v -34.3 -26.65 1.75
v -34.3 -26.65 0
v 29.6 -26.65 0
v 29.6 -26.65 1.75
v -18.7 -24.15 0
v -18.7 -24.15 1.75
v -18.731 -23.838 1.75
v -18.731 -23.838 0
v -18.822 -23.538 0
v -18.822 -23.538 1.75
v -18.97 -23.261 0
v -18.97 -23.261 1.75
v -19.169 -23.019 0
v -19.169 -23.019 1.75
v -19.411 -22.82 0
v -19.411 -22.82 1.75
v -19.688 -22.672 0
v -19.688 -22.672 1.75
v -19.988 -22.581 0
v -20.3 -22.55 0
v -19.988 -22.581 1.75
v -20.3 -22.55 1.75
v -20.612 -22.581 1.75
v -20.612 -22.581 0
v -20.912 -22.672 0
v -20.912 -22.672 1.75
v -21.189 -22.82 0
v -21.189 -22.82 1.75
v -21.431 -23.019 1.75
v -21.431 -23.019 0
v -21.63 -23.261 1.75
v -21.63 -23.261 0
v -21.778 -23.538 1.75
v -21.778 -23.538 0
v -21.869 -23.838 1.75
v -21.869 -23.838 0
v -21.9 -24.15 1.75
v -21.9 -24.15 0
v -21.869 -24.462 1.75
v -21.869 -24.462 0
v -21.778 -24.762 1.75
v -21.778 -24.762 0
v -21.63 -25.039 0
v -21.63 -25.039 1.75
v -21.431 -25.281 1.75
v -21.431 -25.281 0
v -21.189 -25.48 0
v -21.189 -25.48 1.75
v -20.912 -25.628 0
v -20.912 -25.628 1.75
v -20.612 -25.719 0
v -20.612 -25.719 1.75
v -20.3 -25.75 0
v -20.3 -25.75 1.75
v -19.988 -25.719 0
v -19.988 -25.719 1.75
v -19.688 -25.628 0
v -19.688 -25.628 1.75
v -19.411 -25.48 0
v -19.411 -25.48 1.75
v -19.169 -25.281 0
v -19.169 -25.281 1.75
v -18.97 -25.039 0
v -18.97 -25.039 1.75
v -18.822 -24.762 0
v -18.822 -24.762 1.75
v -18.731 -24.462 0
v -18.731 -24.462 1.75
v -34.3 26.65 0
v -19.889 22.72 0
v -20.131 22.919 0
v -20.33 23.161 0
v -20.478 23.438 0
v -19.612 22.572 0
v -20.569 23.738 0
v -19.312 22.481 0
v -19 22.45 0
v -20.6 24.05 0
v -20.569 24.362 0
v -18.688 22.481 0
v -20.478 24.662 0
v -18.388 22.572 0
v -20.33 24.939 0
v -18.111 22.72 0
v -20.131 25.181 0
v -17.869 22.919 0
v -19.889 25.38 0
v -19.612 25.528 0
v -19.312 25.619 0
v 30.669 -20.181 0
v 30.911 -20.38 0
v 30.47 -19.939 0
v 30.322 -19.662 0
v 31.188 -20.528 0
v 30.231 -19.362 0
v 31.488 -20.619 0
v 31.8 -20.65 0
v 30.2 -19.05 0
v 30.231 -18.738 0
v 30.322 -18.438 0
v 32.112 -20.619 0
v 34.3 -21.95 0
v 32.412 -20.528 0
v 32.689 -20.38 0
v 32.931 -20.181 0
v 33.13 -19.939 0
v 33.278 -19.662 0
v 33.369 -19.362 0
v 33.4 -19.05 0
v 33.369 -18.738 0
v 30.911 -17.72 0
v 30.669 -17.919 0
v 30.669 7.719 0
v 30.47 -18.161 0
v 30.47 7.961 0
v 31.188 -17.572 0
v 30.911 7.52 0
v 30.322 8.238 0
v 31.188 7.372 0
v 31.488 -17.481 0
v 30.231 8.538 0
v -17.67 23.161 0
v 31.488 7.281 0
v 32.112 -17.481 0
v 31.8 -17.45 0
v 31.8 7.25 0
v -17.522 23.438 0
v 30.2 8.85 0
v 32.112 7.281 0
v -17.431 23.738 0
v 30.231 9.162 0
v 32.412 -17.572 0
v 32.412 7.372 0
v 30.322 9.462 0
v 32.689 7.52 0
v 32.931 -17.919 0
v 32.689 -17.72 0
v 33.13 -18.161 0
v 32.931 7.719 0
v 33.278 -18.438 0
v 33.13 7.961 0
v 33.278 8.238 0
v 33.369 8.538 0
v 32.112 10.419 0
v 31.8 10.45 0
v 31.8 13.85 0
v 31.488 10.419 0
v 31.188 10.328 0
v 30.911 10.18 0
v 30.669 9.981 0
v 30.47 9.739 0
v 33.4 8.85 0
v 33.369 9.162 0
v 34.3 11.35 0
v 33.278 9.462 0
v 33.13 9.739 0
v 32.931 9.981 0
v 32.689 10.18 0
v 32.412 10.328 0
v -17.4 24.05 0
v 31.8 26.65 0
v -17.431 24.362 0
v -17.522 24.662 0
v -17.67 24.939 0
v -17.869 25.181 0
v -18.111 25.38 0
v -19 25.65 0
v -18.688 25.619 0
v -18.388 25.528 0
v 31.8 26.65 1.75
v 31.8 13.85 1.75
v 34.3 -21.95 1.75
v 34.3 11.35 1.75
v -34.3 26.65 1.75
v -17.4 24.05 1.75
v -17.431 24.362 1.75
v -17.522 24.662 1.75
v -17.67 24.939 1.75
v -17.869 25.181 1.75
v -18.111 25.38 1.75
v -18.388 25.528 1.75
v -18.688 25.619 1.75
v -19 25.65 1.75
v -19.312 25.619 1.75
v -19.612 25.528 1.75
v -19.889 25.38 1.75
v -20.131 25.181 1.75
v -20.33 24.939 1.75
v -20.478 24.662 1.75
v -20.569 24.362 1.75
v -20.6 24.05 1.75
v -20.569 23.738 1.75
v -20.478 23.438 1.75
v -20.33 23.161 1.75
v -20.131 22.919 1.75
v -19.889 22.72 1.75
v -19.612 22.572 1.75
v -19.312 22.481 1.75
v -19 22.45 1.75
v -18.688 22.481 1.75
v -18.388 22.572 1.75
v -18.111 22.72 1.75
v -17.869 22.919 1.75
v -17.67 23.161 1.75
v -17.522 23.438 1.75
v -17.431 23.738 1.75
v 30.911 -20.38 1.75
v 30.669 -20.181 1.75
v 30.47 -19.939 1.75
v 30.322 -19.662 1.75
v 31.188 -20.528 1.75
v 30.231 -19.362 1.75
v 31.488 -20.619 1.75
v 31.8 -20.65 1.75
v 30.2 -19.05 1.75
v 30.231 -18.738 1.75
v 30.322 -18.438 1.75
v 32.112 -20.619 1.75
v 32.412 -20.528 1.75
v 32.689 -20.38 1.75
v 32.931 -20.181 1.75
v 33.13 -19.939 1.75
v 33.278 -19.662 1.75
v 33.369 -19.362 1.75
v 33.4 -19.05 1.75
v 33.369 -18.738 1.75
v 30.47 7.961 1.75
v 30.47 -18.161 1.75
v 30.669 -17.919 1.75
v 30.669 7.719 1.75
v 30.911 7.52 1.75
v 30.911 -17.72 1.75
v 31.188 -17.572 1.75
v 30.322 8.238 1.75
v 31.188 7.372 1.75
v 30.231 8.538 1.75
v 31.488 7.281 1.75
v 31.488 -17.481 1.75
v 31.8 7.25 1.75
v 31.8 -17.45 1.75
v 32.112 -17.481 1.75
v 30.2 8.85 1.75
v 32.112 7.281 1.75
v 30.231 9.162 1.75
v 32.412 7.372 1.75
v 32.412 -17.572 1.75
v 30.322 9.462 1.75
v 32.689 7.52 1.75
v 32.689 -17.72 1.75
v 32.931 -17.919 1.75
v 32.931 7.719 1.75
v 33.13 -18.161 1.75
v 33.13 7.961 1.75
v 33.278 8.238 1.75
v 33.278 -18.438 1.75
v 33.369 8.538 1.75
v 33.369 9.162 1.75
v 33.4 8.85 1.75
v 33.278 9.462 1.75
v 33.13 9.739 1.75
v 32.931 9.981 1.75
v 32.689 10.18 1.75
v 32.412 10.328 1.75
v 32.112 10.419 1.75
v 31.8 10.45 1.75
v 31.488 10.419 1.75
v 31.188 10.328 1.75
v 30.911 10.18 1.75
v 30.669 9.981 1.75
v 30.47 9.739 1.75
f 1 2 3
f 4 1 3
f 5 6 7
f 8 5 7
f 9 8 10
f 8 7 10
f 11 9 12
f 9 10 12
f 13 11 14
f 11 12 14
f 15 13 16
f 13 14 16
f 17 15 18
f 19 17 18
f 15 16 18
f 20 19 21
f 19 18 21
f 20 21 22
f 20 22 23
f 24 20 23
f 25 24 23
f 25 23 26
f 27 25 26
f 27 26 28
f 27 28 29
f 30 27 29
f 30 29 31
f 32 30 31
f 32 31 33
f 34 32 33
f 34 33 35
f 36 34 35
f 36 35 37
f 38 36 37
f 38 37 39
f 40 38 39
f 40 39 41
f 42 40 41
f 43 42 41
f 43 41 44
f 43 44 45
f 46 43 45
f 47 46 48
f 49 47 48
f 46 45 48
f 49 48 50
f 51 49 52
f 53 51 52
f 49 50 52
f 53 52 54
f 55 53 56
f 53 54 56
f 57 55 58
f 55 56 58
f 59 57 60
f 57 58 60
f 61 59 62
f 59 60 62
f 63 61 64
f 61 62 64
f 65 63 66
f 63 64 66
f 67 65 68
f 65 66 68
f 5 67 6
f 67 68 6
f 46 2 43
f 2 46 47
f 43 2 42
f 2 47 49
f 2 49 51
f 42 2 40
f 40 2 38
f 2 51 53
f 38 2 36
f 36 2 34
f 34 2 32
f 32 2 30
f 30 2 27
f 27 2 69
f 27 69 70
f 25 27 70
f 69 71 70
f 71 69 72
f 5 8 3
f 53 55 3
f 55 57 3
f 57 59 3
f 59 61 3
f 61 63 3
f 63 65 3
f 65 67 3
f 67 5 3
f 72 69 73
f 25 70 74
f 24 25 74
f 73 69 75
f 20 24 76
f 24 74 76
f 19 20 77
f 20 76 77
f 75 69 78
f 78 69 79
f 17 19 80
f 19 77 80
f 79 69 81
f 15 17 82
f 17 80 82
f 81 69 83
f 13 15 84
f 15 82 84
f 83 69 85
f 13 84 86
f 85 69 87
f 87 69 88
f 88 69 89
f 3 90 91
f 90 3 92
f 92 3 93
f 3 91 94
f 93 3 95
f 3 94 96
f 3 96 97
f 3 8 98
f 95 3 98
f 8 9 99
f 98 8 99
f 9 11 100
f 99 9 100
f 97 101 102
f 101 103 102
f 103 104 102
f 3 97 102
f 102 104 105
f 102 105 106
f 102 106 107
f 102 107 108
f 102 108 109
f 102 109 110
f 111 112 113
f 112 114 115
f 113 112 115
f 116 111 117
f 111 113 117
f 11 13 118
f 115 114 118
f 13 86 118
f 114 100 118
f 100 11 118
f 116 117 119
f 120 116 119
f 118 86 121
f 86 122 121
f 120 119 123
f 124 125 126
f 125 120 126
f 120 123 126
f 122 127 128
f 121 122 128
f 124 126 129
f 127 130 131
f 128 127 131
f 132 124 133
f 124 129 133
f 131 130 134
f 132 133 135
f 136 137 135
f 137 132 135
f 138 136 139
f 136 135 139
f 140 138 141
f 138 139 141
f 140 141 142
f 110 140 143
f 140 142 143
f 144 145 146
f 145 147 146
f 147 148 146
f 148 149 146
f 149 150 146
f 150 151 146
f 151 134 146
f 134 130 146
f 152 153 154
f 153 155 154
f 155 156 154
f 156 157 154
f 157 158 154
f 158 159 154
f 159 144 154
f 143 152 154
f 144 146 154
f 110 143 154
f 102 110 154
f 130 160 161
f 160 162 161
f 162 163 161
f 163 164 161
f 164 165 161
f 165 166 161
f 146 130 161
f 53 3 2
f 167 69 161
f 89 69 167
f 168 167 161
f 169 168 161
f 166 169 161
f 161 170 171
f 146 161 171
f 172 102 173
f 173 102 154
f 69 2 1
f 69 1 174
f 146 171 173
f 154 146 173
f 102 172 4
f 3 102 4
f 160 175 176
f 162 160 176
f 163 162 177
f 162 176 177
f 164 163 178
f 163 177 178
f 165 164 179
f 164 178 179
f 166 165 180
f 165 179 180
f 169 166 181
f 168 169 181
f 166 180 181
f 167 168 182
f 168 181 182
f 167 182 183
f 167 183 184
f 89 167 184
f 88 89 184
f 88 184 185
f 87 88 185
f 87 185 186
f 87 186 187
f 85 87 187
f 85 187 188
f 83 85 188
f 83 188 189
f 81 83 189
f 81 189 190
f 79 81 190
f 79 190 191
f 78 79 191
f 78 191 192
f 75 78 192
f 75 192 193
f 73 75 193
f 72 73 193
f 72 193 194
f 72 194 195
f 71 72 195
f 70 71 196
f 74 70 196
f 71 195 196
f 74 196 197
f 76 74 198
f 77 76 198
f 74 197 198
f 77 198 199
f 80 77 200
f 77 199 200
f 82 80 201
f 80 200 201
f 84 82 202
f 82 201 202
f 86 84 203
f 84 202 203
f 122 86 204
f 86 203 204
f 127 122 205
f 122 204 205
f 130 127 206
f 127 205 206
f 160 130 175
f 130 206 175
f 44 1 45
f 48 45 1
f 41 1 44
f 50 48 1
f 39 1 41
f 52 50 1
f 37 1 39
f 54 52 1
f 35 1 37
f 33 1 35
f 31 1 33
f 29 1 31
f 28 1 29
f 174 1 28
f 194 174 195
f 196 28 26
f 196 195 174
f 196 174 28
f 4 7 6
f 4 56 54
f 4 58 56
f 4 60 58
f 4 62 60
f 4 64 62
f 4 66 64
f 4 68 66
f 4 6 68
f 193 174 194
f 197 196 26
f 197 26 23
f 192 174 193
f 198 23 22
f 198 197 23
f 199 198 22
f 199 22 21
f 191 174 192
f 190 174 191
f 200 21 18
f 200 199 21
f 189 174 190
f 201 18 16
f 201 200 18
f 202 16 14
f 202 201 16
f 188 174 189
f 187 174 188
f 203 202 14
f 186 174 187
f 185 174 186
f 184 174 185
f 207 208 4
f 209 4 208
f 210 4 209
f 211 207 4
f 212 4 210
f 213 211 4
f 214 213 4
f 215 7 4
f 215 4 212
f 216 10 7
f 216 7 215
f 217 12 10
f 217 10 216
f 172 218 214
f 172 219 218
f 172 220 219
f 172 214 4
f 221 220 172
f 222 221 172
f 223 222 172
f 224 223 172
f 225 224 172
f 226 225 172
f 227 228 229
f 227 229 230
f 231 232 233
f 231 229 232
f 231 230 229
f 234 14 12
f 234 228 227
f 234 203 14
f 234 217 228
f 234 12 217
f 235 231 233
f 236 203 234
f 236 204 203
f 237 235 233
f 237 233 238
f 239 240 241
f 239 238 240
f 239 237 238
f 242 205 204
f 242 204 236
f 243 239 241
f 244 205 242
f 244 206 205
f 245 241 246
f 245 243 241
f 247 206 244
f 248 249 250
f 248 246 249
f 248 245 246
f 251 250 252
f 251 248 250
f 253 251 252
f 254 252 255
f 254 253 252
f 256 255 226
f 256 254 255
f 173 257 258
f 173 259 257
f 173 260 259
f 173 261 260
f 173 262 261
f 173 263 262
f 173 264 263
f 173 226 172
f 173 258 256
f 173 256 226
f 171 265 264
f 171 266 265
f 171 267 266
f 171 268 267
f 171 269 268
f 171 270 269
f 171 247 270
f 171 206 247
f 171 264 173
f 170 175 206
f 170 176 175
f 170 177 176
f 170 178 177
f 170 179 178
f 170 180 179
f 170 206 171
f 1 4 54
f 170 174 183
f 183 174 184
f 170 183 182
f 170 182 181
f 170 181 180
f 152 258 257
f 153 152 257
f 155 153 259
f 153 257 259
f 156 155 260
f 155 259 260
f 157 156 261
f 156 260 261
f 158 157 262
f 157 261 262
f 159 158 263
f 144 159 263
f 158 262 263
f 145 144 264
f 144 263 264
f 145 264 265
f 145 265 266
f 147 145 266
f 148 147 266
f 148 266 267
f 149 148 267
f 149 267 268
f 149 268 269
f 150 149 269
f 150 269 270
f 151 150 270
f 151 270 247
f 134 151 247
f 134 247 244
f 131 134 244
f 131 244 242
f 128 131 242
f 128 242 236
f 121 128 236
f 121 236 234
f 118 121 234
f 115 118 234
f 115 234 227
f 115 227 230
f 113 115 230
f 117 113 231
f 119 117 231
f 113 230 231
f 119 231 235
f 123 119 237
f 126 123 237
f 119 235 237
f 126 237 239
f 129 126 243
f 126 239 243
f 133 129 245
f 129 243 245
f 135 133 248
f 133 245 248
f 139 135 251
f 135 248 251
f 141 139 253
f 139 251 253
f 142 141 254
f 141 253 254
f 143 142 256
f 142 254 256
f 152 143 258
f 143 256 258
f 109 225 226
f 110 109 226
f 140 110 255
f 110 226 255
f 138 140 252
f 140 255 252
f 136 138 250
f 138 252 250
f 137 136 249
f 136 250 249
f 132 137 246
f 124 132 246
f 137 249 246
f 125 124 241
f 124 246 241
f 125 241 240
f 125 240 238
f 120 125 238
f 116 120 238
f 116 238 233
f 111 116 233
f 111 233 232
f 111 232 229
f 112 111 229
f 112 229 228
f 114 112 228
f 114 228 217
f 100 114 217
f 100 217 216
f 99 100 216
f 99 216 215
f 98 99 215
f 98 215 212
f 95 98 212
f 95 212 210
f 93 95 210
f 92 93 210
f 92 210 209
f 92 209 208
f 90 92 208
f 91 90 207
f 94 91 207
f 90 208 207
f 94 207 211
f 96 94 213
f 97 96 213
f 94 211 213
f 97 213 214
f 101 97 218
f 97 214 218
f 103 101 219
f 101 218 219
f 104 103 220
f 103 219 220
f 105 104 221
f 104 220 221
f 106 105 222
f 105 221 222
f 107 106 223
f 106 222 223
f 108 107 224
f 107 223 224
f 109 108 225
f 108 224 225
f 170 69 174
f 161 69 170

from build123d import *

# Parameters (mm, degrees)
SKETCH1_W           = 68.6
SKETCH1_H           = 53.3
BOSS_EXTRUDE1_DEPTH = 1.75
SKETCH2_R           = 1.6
CUT_EXTRUDE1_DEPTH  = 2.75
CUT_EXTRUDE2_DEPTH  = 2.75


with BuildPart() as part:
    # Sketch1 → Boss-Extrude1 (new body)
    with BuildSketch(Plane.XY):
        Rectangle(SKETCH1_W, SKETCH1_H)
    extrude(amount=BOSS_EXTRUDE1_DEPTH)

    # Sketch2 → Cut-Extrude1 (cut, through all)
    with BuildSketch(Plane.XY.offset(1.75)):
        with Locations((-19, 24.05)):
            Circle(SKETCH2_R)
        with Locations((-20.3, -24.15)):
            Circle(SKETCH2_R)
        with Locations((31.8, 8.85)):
            Circle(SKETCH2_R)
        with Locations((31.8, -19.05)):
            Circle(SKETCH2_R)
    extrude(amount=-CUT_EXTRUDE1_DEPTH, mode=Mode.SUBTRACT)

    # Sketch3 → Cut-Extrude2 (cut, through all)
    with BuildSketch(Plane.XY.offset(1.75)):
        Polygon((31.8, 26.65), (31.8, 13.85), (50.94988261, -5.29988261), (28.344966041, -27.904799179), (59.308885604, -27.904799179), (59.308885604, 26.65), align=None)
    extrude(amount=-CUT_EXTRUDE2_DEPTH, mode=Mode.SUBTRACT)


solid = part.part
